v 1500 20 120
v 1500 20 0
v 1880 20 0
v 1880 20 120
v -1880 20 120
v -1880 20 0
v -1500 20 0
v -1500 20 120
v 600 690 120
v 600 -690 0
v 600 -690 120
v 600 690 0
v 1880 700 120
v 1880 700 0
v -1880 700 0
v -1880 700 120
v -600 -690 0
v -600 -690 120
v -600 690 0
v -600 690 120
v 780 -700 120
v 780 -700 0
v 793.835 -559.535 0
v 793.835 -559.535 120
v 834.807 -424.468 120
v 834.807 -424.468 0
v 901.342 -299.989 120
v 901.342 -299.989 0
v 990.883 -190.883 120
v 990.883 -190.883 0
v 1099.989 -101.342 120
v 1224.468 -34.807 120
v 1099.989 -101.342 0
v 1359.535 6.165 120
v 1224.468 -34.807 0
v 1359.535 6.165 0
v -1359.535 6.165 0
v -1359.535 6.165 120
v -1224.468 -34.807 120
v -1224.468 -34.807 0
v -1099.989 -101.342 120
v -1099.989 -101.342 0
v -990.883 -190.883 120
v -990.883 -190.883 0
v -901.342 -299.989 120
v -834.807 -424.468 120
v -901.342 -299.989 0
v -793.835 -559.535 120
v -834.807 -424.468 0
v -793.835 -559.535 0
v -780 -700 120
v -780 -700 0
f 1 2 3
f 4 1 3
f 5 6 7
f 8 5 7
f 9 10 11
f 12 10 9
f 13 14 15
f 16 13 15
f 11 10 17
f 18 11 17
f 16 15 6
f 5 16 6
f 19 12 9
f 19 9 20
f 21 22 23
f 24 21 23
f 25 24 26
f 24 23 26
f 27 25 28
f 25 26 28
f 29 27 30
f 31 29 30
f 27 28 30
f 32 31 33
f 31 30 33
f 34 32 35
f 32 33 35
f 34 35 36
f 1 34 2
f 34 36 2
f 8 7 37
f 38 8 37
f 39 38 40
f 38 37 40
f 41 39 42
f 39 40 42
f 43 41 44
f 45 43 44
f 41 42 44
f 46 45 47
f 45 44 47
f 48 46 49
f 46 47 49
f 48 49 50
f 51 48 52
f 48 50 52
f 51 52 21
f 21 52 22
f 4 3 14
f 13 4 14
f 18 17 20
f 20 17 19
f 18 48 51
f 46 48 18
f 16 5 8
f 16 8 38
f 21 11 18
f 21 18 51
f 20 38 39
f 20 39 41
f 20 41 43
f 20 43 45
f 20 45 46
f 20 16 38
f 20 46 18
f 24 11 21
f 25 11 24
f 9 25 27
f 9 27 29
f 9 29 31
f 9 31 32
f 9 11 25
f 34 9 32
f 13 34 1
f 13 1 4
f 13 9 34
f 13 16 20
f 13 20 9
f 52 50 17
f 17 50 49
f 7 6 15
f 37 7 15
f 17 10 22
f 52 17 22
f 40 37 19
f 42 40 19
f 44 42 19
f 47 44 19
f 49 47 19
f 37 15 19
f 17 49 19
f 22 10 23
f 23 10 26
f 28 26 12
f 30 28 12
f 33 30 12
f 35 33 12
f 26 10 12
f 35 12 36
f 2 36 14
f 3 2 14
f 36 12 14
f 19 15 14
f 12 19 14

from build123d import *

# Parameters (mm, degrees)
BOSS_EXTRUDE1_DEPTH = 120
SKETCH2_W           = 1200
SKETCH2_H           = 1380
CUT_EXTRUDE1_DEPTH  = 120


with BuildPart() as part:
    # Sketch1 → Boss-Extrude1 (new body)
    with BuildSketch(Plane.XY):
        with BuildLine():
            ThreePointArc((780, -700), (990.883117546, -190.883117546), (1500, 20))
            Line((1500, 20), (1880, 20))
            Line((1880, 20), (1880, 700))
            Line((1880, 700), (-1880, 700))
            Line((-1880, 700), (-1880, 20))
            Line((-1880, 20), (-1500, 20))
            ThreePointArc((-1500, 20), (-990.883117546, -190.883117546), (-780, -700))
            Line((-780, -700), (780, -700))
        make_face()
    extrude(amount=BOSS_EXTRUDE1_DEPTH)

    # Sketch2 → Cut-Extrude1 (cut)
    with BuildSketch(Plane(origin=(0, 0, 0), x_dir=(-1, 0, 0), z_dir=(0, 0, -1))):
        Rectangle(SKETCH2_W, SKETCH2_H)
    extrude(amount=-CUT_EXTRUDE1_DEPTH, mode=Mode.SUBTRACT)


solid = part.part
